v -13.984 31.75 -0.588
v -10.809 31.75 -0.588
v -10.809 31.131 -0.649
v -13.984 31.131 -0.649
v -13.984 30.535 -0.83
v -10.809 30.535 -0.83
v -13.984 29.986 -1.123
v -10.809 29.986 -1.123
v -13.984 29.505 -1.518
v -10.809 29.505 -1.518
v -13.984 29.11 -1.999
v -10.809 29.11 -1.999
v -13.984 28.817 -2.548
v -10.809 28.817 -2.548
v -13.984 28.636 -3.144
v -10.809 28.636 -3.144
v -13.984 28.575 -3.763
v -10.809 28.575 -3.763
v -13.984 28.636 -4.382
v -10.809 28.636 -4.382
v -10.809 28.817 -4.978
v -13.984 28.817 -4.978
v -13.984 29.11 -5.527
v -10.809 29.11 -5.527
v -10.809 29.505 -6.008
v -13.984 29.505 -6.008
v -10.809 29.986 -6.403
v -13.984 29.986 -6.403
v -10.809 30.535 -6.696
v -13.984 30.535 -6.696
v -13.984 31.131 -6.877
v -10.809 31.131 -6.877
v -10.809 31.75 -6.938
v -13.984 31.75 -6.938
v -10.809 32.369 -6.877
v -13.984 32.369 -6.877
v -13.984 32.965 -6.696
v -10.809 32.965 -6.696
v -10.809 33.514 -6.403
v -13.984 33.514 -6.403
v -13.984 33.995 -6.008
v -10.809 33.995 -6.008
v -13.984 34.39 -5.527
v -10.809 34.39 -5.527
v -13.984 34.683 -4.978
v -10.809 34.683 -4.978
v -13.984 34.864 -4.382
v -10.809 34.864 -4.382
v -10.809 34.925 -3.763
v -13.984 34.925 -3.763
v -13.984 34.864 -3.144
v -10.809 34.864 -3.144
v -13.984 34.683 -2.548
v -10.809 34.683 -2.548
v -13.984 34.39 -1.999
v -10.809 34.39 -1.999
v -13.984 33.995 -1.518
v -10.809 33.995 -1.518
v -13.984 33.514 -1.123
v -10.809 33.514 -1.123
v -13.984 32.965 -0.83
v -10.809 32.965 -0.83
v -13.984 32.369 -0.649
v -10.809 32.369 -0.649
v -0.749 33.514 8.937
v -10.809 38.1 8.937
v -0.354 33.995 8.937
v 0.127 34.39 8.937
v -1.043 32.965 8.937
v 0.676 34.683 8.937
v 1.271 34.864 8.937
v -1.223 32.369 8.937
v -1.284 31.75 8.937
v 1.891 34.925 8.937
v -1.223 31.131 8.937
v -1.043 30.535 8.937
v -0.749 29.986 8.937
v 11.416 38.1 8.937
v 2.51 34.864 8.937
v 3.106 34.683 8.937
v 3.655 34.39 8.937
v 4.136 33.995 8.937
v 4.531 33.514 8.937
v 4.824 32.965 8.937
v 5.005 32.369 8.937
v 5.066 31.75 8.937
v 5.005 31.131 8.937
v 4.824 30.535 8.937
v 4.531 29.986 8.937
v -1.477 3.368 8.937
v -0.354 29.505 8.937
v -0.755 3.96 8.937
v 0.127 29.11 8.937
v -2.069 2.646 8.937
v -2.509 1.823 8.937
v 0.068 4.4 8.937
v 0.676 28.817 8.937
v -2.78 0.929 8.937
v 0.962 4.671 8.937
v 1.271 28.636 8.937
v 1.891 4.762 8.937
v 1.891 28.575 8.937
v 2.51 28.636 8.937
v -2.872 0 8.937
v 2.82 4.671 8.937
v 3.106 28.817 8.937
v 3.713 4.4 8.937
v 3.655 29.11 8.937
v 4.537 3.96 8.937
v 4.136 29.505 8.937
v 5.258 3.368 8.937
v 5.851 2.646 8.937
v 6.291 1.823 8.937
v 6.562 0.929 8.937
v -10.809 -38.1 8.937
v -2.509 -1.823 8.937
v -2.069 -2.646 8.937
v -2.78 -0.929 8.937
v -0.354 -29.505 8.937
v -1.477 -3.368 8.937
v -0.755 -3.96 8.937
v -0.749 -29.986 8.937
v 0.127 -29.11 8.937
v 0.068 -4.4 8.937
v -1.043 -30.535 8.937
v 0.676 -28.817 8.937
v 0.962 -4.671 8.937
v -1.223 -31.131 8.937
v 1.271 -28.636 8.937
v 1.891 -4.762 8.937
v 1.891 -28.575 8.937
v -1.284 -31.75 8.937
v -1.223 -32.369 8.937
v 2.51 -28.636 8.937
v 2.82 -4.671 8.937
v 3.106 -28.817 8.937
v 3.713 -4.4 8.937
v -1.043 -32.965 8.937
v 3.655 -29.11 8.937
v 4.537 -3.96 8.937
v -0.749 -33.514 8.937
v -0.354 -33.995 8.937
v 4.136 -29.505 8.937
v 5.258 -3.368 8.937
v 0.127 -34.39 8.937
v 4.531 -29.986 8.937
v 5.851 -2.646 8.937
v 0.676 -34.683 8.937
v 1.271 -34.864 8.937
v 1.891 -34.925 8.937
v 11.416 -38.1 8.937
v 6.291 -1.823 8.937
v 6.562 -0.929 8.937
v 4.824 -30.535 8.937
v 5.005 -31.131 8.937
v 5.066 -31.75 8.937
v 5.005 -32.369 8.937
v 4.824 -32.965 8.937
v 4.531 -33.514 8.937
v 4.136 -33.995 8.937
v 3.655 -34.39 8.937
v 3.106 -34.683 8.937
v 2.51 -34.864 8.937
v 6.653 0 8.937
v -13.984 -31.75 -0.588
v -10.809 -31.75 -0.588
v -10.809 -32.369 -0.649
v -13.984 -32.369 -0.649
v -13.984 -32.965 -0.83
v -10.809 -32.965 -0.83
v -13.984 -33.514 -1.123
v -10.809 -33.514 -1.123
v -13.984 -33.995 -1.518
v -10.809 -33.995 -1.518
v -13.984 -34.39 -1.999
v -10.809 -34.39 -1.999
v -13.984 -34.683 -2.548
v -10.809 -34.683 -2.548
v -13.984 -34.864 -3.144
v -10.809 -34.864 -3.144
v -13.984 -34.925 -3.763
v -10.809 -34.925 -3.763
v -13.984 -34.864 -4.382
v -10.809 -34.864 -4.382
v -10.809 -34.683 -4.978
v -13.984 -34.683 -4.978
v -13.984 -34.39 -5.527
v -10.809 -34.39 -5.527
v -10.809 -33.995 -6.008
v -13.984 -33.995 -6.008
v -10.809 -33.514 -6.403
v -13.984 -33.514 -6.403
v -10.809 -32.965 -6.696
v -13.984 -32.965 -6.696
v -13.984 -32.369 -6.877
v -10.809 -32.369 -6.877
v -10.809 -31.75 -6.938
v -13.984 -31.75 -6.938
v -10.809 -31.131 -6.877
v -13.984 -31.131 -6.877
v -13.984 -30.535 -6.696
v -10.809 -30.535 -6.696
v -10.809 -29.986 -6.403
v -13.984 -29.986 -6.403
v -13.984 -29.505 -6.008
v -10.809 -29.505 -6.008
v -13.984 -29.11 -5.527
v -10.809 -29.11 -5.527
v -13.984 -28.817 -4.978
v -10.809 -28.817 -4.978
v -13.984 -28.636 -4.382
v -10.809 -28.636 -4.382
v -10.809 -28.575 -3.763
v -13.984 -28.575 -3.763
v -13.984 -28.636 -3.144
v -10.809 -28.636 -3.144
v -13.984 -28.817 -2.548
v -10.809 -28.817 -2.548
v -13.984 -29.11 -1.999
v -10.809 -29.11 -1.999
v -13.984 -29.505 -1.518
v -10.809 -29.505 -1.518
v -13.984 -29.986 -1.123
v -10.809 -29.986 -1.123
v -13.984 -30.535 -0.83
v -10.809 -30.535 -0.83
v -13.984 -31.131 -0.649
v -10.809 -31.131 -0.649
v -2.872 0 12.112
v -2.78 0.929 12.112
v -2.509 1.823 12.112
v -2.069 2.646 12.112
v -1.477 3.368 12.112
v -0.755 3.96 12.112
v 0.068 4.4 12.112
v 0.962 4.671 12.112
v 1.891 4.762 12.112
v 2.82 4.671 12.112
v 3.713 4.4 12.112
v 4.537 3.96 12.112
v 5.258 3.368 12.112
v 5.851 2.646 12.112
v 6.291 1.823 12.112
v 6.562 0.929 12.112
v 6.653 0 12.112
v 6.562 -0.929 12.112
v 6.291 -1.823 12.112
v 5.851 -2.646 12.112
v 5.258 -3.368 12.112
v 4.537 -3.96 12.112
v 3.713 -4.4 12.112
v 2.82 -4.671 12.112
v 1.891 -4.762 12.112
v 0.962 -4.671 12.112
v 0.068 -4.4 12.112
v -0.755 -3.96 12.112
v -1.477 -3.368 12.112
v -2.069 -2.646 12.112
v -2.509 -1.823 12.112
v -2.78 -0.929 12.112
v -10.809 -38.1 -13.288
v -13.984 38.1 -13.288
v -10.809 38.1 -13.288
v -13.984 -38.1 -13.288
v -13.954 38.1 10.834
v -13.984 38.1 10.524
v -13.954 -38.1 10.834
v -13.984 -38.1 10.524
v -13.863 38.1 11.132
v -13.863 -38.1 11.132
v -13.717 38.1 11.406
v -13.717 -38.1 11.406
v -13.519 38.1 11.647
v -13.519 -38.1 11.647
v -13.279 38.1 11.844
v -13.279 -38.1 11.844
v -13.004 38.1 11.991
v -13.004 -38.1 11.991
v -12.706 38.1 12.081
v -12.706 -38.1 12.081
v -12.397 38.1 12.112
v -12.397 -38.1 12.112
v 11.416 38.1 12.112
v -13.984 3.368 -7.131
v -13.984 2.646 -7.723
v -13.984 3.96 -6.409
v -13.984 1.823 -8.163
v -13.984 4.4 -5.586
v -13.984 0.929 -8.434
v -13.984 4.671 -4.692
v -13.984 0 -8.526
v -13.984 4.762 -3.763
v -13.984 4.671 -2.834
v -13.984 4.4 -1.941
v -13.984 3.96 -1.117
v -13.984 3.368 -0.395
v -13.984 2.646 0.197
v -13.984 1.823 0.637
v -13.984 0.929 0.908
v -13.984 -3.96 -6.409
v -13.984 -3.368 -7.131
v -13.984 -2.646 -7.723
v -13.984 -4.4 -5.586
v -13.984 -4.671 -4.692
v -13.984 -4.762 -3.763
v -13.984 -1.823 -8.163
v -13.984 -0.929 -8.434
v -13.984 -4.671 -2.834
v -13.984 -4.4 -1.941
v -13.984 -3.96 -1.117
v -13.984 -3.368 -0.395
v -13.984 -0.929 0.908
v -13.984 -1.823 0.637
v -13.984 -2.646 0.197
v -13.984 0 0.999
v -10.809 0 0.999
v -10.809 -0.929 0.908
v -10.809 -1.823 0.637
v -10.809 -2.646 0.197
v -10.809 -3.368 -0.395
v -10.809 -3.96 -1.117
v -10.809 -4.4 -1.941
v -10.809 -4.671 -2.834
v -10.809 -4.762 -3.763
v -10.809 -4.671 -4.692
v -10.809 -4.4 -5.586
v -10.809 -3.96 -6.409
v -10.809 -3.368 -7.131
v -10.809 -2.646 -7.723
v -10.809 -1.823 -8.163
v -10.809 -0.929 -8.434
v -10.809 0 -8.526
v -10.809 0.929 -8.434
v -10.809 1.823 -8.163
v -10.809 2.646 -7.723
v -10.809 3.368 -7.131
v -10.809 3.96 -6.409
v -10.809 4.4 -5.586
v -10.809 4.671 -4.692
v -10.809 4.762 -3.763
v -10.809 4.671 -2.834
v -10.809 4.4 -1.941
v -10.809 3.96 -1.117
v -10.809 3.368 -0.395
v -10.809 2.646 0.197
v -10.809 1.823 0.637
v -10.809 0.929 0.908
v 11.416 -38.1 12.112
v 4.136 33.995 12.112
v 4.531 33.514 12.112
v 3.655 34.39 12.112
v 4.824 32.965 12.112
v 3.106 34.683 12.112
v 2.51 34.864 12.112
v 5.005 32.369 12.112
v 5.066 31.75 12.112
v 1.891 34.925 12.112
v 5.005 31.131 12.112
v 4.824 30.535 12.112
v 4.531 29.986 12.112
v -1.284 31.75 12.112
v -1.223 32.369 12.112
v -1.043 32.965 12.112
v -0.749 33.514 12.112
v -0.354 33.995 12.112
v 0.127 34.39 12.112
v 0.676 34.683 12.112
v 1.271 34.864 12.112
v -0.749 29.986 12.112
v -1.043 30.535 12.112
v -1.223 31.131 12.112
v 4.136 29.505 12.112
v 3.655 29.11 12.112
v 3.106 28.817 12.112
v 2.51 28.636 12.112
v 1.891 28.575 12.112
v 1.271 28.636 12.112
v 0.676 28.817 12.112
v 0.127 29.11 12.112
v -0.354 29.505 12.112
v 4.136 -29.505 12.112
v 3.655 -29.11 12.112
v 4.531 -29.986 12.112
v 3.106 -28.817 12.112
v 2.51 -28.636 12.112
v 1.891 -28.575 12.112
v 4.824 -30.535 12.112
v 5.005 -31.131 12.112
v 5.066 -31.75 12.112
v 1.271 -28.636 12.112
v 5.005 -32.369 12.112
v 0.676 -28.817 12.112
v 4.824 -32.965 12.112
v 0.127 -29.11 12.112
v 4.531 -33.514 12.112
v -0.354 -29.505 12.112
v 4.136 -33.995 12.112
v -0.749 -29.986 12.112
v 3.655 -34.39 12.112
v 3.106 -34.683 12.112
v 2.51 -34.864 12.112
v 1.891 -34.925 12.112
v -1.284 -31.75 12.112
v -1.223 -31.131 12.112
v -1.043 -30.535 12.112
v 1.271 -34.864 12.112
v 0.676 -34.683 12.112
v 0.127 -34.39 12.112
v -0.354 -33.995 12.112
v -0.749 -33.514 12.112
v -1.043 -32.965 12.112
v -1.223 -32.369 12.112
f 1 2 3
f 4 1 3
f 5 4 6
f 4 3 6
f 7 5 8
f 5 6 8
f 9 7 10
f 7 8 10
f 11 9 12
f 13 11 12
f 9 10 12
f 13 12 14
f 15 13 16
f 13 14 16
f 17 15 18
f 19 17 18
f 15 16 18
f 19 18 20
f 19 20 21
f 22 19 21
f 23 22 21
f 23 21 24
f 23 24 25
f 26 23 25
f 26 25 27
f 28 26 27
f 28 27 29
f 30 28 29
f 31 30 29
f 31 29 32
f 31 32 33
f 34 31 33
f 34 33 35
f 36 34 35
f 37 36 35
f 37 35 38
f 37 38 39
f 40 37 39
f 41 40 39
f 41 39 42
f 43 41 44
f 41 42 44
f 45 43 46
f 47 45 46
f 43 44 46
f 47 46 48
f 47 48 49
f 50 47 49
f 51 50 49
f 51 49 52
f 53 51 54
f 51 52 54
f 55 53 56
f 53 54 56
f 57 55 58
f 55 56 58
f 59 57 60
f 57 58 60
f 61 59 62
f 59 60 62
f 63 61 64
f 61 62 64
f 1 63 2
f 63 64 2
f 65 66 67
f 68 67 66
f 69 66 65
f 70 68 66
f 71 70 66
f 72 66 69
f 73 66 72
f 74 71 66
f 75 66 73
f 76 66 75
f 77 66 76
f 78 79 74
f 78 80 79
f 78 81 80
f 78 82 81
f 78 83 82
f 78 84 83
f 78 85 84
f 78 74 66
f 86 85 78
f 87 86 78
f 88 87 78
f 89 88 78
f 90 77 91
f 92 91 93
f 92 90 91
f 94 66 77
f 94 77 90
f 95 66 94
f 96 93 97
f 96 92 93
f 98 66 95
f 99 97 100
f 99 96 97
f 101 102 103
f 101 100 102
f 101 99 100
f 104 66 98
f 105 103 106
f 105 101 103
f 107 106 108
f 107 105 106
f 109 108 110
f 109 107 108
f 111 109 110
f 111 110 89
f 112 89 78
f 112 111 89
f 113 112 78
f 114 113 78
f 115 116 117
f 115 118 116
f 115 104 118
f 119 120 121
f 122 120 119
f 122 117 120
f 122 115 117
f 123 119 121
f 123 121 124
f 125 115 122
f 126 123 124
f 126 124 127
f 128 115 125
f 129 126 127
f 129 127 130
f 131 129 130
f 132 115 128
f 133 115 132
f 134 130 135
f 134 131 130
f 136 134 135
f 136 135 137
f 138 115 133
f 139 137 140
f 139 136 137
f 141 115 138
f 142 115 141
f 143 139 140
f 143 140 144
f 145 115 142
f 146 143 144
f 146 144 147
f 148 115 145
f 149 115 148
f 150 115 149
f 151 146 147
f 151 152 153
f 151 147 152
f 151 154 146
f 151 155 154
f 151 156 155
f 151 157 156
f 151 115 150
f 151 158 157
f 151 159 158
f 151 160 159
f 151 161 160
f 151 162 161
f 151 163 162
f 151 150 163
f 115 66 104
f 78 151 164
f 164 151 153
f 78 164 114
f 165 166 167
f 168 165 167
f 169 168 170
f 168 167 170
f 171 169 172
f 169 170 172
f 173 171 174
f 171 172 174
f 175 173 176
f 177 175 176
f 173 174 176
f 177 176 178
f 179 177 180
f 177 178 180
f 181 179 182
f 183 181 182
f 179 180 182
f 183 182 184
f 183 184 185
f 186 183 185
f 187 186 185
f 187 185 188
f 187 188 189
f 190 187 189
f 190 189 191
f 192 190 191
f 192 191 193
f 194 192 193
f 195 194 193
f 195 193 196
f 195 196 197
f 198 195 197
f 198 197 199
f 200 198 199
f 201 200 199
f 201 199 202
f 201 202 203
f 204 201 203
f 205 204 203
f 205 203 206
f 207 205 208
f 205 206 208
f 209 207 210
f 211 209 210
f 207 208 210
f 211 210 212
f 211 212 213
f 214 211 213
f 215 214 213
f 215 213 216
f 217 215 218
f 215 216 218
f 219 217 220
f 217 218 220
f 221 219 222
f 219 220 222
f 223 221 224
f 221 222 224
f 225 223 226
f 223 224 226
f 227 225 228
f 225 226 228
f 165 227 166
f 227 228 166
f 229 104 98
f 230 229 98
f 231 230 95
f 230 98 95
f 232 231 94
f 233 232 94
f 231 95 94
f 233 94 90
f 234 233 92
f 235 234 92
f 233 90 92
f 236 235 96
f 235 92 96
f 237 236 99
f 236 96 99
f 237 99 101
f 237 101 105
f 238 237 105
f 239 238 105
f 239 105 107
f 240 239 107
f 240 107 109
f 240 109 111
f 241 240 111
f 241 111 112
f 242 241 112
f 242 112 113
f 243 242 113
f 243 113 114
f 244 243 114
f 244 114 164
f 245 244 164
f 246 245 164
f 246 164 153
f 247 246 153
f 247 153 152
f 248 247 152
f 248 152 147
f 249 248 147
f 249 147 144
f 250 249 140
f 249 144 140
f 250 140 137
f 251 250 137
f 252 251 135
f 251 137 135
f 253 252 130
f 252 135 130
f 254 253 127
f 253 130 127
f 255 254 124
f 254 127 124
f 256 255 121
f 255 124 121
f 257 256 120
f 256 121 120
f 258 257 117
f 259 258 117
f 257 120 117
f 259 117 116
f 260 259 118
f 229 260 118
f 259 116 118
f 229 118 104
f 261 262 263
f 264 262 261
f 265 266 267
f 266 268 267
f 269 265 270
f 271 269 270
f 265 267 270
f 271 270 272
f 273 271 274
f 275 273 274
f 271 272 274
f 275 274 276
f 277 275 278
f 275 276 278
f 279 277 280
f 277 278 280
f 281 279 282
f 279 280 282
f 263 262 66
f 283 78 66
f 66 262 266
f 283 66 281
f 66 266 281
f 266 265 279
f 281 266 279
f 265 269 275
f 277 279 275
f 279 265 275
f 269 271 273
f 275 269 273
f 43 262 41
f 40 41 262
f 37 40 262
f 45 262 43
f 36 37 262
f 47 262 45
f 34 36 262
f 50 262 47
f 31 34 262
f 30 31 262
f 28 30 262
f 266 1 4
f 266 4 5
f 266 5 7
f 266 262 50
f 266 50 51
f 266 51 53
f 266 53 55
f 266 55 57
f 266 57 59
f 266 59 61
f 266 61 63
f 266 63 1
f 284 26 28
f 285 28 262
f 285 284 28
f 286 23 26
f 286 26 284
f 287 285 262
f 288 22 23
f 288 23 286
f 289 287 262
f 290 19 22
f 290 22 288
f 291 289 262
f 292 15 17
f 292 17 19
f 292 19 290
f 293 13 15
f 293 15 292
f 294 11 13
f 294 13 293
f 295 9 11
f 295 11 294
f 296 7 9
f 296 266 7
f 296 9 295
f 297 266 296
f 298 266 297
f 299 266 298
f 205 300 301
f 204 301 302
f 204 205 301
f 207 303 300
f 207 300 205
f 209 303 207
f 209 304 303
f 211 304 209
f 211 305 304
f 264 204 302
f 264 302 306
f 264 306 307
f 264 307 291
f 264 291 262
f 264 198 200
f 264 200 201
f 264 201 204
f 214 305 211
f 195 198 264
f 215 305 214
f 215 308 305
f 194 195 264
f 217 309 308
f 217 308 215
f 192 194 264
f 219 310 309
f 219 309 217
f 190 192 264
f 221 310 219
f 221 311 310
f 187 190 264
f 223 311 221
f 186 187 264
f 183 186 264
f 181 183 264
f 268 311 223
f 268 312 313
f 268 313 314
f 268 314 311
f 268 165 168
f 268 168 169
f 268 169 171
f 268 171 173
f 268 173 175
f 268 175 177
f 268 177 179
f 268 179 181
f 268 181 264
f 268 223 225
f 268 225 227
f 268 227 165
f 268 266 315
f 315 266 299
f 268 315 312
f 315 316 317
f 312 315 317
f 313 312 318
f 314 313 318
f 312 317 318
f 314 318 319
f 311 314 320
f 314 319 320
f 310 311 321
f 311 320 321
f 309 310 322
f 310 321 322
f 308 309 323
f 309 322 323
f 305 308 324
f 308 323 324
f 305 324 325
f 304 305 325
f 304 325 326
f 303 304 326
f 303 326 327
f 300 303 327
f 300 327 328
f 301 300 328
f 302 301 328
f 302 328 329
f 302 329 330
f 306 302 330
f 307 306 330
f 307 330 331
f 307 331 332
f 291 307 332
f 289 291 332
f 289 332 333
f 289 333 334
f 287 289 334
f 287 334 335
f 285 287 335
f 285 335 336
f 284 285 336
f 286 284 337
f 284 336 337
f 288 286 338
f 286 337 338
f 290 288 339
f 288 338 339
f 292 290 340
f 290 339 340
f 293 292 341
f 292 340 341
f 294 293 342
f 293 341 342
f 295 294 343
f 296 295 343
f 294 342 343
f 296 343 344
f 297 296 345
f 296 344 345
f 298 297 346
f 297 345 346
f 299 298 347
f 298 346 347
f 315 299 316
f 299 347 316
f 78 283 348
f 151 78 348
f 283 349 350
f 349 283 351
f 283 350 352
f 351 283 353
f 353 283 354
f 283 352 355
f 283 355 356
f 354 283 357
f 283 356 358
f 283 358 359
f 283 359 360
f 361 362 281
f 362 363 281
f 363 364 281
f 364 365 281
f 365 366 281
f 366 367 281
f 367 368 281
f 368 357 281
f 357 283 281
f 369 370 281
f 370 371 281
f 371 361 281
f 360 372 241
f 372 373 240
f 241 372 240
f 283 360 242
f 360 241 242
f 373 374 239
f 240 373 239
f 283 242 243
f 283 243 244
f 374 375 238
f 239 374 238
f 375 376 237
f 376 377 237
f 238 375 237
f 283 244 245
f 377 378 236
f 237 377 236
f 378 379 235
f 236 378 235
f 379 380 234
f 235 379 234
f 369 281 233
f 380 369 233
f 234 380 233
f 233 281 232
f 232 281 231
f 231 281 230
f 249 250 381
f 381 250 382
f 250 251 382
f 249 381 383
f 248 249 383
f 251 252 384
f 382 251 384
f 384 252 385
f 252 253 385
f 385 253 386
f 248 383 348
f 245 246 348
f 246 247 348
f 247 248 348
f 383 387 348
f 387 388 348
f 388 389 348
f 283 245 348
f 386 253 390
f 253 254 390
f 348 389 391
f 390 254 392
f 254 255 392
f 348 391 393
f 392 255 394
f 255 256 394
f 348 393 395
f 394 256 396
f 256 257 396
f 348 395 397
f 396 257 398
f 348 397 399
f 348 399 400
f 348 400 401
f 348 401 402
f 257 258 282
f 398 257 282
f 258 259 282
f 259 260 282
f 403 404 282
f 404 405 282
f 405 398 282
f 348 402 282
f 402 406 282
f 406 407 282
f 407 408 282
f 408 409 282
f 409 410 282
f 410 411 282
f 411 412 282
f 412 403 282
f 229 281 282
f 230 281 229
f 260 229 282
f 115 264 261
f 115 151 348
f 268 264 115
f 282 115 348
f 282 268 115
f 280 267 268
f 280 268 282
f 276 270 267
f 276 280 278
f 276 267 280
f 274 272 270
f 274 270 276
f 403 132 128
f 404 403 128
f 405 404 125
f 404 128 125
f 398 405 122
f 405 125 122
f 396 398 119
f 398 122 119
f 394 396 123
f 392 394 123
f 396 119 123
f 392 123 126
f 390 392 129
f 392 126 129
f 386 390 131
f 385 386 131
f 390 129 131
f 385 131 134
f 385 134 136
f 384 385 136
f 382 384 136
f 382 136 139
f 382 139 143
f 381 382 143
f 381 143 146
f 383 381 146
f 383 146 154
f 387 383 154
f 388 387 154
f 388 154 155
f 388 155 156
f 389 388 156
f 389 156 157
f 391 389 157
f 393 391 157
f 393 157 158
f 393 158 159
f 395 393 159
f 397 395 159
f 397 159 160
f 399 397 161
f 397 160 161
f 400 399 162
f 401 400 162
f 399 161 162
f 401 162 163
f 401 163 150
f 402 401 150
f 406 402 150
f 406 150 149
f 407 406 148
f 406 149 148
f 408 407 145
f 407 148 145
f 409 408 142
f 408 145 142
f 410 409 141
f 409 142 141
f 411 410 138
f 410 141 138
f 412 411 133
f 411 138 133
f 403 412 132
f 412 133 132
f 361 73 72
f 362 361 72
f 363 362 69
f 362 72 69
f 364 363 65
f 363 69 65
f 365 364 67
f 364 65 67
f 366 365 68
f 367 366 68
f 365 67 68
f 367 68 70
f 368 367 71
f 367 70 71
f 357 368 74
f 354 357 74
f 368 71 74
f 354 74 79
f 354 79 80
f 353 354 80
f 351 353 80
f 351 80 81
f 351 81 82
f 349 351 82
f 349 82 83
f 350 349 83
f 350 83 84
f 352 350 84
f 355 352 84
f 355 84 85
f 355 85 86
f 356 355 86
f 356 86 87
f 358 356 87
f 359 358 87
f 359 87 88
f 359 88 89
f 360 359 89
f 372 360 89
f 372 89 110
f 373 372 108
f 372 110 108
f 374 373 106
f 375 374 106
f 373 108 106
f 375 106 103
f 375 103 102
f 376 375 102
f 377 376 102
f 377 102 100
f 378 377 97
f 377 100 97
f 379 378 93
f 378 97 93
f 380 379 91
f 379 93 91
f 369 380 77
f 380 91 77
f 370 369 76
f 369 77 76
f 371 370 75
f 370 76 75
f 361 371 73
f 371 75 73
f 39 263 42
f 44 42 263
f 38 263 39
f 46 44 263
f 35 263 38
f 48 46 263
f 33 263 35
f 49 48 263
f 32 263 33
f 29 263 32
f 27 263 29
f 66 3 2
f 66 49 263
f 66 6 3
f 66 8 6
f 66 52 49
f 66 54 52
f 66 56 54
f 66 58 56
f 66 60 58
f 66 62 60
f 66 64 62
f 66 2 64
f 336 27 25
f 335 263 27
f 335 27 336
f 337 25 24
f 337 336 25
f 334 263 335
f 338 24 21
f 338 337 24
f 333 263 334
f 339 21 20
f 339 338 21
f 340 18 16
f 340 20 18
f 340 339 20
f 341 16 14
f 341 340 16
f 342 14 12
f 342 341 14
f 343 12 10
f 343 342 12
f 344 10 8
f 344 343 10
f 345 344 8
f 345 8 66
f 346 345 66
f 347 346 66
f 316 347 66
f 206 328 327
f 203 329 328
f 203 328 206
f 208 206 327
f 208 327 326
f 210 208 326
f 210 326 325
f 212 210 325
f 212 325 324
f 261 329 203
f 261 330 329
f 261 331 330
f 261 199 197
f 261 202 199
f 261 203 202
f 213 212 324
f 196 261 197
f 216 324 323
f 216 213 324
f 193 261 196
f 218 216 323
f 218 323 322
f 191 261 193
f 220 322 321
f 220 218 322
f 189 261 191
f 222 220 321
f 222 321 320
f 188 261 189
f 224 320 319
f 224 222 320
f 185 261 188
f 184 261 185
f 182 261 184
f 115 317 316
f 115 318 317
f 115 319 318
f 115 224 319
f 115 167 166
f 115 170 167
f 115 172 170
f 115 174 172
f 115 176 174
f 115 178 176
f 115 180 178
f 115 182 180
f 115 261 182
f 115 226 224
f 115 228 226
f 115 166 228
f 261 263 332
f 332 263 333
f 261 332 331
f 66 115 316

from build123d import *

# Parameters (mm, degrees)
SKETCH1_W                                 = 76.2
SKETCH1_H                                 = 25.4
BOSS_EXTRUDE1_DEPTH                       = 25.4
SKETCH2_W                                 = 22.225
SKETCH2_H                                 = 22.225
CUT_EXTRUDE1_DEPTH                        = 77.2
FILLET1_R                                 = 1.5875
F_1_4_0_25_DIAMETER_HOLE4_D               = 6.35
F_1_4_0_25_DIAMETER_HOLE4_DEPTH           = 3.175
F_1_4_0_25_DIAMETER_HOLE4_ON_FACE_2_D     = 6.35
F_1_4_0_25_DIAMETER_HOLE4_ON_FACE_2_DEPTH = 3.175
F_3_8_0_375_DIAMETER_HOLE1_D              = 9.525
F_3_8_0_375_DIAMETER_HOLE1_ON_FACE_2_D    = 9.525


with BuildPart() as part:
    # Sketch1 → Boss-Extrude1 (new body)
    with BuildSketch(Plane(origin=(-13.984269616, 0, 0), x_dir=(0, -1, 0), z_dir=(-1, 0, 0))):
        with Locations((0, -0.588041782)):
            Rectangle(SKETCH1_W, SKETCH1_H)
    extrude(amount=-BOSS_EXTRUDE1_DEPTH)

    # Sketch2 → Cut-Extrude1 (cut, through all)
    with BuildSketch(Plane.XZ.offset(38.1)):
        with Locations((0.303230384, -2.175541782)):
            Rectangle(SKETCH2_W, SKETCH2_H)
    extrude(amount=-CUT_EXTRUDE1_DEPTH, mode=Mode.SUBTRACT)

    # Fillet1
    fillet1_edges = [part.edges().sort_by_distance(p)[0] for p in [
        (-13.984269616, 0, 12.111958218),
    ]]
    fillet(fillet1_edges, radius=FILLET1_R)

    # 1/4 (0.25) Diameter Hole4
    with Locations(Plane(origin=(1.890730384, 31.75, 12.111958218), x_dir=(1, 0, 0), z_dir=(0, 0, 1))):
        with Locations((0, 0), (0, -63.5)):
            Hole(F_1_4_0_25_DIAMETER_HOLE4_D / 2, depth=F_1_4_0_25_DIAMETER_HOLE4_DEPTH)

    # 1/4 (0.25) Diameter Hole4 on face 2
    with Locations(Plane(origin=(-13.984269616, 31.75, -3.763041782), x_dir=(0, 0, -1), z_dir=(-1, 0, 0))):
        with Locations((0, 0), (0, 63.5)):
            Hole(F_1_4_0_25_DIAMETER_HOLE4_ON_FACE_2_D / 2, depth=F_1_4_0_25_DIAMETER_HOLE4_ON_FACE_2_DEPTH)

    # 3/8 (0.375) Diameter Hole1 (through all)
    with Locations(Plane(origin=(-13.984269616, 0, -3.763041782), x_dir=(0, 0, -1), z_dir=(-1, 0, 0))):
        with Locations((0, 0)):
            Hole(F_3_8_0_375_DIAMETER_HOLE1_D / 2)

    # 3/8 (0.375) Diameter Hole1 on face 2 (through all)
    with Locations(Plane(origin=(1.890730384, 0, 12.111958218), x_dir=(1, 0, 0), z_dir=(0, 0, 1))):
        with Locations((0, 0)):
            Hole(F_3_8_0_375_DIAMETER_HOLE1_ON_FACE_2_D / 2)


solid = part.part
